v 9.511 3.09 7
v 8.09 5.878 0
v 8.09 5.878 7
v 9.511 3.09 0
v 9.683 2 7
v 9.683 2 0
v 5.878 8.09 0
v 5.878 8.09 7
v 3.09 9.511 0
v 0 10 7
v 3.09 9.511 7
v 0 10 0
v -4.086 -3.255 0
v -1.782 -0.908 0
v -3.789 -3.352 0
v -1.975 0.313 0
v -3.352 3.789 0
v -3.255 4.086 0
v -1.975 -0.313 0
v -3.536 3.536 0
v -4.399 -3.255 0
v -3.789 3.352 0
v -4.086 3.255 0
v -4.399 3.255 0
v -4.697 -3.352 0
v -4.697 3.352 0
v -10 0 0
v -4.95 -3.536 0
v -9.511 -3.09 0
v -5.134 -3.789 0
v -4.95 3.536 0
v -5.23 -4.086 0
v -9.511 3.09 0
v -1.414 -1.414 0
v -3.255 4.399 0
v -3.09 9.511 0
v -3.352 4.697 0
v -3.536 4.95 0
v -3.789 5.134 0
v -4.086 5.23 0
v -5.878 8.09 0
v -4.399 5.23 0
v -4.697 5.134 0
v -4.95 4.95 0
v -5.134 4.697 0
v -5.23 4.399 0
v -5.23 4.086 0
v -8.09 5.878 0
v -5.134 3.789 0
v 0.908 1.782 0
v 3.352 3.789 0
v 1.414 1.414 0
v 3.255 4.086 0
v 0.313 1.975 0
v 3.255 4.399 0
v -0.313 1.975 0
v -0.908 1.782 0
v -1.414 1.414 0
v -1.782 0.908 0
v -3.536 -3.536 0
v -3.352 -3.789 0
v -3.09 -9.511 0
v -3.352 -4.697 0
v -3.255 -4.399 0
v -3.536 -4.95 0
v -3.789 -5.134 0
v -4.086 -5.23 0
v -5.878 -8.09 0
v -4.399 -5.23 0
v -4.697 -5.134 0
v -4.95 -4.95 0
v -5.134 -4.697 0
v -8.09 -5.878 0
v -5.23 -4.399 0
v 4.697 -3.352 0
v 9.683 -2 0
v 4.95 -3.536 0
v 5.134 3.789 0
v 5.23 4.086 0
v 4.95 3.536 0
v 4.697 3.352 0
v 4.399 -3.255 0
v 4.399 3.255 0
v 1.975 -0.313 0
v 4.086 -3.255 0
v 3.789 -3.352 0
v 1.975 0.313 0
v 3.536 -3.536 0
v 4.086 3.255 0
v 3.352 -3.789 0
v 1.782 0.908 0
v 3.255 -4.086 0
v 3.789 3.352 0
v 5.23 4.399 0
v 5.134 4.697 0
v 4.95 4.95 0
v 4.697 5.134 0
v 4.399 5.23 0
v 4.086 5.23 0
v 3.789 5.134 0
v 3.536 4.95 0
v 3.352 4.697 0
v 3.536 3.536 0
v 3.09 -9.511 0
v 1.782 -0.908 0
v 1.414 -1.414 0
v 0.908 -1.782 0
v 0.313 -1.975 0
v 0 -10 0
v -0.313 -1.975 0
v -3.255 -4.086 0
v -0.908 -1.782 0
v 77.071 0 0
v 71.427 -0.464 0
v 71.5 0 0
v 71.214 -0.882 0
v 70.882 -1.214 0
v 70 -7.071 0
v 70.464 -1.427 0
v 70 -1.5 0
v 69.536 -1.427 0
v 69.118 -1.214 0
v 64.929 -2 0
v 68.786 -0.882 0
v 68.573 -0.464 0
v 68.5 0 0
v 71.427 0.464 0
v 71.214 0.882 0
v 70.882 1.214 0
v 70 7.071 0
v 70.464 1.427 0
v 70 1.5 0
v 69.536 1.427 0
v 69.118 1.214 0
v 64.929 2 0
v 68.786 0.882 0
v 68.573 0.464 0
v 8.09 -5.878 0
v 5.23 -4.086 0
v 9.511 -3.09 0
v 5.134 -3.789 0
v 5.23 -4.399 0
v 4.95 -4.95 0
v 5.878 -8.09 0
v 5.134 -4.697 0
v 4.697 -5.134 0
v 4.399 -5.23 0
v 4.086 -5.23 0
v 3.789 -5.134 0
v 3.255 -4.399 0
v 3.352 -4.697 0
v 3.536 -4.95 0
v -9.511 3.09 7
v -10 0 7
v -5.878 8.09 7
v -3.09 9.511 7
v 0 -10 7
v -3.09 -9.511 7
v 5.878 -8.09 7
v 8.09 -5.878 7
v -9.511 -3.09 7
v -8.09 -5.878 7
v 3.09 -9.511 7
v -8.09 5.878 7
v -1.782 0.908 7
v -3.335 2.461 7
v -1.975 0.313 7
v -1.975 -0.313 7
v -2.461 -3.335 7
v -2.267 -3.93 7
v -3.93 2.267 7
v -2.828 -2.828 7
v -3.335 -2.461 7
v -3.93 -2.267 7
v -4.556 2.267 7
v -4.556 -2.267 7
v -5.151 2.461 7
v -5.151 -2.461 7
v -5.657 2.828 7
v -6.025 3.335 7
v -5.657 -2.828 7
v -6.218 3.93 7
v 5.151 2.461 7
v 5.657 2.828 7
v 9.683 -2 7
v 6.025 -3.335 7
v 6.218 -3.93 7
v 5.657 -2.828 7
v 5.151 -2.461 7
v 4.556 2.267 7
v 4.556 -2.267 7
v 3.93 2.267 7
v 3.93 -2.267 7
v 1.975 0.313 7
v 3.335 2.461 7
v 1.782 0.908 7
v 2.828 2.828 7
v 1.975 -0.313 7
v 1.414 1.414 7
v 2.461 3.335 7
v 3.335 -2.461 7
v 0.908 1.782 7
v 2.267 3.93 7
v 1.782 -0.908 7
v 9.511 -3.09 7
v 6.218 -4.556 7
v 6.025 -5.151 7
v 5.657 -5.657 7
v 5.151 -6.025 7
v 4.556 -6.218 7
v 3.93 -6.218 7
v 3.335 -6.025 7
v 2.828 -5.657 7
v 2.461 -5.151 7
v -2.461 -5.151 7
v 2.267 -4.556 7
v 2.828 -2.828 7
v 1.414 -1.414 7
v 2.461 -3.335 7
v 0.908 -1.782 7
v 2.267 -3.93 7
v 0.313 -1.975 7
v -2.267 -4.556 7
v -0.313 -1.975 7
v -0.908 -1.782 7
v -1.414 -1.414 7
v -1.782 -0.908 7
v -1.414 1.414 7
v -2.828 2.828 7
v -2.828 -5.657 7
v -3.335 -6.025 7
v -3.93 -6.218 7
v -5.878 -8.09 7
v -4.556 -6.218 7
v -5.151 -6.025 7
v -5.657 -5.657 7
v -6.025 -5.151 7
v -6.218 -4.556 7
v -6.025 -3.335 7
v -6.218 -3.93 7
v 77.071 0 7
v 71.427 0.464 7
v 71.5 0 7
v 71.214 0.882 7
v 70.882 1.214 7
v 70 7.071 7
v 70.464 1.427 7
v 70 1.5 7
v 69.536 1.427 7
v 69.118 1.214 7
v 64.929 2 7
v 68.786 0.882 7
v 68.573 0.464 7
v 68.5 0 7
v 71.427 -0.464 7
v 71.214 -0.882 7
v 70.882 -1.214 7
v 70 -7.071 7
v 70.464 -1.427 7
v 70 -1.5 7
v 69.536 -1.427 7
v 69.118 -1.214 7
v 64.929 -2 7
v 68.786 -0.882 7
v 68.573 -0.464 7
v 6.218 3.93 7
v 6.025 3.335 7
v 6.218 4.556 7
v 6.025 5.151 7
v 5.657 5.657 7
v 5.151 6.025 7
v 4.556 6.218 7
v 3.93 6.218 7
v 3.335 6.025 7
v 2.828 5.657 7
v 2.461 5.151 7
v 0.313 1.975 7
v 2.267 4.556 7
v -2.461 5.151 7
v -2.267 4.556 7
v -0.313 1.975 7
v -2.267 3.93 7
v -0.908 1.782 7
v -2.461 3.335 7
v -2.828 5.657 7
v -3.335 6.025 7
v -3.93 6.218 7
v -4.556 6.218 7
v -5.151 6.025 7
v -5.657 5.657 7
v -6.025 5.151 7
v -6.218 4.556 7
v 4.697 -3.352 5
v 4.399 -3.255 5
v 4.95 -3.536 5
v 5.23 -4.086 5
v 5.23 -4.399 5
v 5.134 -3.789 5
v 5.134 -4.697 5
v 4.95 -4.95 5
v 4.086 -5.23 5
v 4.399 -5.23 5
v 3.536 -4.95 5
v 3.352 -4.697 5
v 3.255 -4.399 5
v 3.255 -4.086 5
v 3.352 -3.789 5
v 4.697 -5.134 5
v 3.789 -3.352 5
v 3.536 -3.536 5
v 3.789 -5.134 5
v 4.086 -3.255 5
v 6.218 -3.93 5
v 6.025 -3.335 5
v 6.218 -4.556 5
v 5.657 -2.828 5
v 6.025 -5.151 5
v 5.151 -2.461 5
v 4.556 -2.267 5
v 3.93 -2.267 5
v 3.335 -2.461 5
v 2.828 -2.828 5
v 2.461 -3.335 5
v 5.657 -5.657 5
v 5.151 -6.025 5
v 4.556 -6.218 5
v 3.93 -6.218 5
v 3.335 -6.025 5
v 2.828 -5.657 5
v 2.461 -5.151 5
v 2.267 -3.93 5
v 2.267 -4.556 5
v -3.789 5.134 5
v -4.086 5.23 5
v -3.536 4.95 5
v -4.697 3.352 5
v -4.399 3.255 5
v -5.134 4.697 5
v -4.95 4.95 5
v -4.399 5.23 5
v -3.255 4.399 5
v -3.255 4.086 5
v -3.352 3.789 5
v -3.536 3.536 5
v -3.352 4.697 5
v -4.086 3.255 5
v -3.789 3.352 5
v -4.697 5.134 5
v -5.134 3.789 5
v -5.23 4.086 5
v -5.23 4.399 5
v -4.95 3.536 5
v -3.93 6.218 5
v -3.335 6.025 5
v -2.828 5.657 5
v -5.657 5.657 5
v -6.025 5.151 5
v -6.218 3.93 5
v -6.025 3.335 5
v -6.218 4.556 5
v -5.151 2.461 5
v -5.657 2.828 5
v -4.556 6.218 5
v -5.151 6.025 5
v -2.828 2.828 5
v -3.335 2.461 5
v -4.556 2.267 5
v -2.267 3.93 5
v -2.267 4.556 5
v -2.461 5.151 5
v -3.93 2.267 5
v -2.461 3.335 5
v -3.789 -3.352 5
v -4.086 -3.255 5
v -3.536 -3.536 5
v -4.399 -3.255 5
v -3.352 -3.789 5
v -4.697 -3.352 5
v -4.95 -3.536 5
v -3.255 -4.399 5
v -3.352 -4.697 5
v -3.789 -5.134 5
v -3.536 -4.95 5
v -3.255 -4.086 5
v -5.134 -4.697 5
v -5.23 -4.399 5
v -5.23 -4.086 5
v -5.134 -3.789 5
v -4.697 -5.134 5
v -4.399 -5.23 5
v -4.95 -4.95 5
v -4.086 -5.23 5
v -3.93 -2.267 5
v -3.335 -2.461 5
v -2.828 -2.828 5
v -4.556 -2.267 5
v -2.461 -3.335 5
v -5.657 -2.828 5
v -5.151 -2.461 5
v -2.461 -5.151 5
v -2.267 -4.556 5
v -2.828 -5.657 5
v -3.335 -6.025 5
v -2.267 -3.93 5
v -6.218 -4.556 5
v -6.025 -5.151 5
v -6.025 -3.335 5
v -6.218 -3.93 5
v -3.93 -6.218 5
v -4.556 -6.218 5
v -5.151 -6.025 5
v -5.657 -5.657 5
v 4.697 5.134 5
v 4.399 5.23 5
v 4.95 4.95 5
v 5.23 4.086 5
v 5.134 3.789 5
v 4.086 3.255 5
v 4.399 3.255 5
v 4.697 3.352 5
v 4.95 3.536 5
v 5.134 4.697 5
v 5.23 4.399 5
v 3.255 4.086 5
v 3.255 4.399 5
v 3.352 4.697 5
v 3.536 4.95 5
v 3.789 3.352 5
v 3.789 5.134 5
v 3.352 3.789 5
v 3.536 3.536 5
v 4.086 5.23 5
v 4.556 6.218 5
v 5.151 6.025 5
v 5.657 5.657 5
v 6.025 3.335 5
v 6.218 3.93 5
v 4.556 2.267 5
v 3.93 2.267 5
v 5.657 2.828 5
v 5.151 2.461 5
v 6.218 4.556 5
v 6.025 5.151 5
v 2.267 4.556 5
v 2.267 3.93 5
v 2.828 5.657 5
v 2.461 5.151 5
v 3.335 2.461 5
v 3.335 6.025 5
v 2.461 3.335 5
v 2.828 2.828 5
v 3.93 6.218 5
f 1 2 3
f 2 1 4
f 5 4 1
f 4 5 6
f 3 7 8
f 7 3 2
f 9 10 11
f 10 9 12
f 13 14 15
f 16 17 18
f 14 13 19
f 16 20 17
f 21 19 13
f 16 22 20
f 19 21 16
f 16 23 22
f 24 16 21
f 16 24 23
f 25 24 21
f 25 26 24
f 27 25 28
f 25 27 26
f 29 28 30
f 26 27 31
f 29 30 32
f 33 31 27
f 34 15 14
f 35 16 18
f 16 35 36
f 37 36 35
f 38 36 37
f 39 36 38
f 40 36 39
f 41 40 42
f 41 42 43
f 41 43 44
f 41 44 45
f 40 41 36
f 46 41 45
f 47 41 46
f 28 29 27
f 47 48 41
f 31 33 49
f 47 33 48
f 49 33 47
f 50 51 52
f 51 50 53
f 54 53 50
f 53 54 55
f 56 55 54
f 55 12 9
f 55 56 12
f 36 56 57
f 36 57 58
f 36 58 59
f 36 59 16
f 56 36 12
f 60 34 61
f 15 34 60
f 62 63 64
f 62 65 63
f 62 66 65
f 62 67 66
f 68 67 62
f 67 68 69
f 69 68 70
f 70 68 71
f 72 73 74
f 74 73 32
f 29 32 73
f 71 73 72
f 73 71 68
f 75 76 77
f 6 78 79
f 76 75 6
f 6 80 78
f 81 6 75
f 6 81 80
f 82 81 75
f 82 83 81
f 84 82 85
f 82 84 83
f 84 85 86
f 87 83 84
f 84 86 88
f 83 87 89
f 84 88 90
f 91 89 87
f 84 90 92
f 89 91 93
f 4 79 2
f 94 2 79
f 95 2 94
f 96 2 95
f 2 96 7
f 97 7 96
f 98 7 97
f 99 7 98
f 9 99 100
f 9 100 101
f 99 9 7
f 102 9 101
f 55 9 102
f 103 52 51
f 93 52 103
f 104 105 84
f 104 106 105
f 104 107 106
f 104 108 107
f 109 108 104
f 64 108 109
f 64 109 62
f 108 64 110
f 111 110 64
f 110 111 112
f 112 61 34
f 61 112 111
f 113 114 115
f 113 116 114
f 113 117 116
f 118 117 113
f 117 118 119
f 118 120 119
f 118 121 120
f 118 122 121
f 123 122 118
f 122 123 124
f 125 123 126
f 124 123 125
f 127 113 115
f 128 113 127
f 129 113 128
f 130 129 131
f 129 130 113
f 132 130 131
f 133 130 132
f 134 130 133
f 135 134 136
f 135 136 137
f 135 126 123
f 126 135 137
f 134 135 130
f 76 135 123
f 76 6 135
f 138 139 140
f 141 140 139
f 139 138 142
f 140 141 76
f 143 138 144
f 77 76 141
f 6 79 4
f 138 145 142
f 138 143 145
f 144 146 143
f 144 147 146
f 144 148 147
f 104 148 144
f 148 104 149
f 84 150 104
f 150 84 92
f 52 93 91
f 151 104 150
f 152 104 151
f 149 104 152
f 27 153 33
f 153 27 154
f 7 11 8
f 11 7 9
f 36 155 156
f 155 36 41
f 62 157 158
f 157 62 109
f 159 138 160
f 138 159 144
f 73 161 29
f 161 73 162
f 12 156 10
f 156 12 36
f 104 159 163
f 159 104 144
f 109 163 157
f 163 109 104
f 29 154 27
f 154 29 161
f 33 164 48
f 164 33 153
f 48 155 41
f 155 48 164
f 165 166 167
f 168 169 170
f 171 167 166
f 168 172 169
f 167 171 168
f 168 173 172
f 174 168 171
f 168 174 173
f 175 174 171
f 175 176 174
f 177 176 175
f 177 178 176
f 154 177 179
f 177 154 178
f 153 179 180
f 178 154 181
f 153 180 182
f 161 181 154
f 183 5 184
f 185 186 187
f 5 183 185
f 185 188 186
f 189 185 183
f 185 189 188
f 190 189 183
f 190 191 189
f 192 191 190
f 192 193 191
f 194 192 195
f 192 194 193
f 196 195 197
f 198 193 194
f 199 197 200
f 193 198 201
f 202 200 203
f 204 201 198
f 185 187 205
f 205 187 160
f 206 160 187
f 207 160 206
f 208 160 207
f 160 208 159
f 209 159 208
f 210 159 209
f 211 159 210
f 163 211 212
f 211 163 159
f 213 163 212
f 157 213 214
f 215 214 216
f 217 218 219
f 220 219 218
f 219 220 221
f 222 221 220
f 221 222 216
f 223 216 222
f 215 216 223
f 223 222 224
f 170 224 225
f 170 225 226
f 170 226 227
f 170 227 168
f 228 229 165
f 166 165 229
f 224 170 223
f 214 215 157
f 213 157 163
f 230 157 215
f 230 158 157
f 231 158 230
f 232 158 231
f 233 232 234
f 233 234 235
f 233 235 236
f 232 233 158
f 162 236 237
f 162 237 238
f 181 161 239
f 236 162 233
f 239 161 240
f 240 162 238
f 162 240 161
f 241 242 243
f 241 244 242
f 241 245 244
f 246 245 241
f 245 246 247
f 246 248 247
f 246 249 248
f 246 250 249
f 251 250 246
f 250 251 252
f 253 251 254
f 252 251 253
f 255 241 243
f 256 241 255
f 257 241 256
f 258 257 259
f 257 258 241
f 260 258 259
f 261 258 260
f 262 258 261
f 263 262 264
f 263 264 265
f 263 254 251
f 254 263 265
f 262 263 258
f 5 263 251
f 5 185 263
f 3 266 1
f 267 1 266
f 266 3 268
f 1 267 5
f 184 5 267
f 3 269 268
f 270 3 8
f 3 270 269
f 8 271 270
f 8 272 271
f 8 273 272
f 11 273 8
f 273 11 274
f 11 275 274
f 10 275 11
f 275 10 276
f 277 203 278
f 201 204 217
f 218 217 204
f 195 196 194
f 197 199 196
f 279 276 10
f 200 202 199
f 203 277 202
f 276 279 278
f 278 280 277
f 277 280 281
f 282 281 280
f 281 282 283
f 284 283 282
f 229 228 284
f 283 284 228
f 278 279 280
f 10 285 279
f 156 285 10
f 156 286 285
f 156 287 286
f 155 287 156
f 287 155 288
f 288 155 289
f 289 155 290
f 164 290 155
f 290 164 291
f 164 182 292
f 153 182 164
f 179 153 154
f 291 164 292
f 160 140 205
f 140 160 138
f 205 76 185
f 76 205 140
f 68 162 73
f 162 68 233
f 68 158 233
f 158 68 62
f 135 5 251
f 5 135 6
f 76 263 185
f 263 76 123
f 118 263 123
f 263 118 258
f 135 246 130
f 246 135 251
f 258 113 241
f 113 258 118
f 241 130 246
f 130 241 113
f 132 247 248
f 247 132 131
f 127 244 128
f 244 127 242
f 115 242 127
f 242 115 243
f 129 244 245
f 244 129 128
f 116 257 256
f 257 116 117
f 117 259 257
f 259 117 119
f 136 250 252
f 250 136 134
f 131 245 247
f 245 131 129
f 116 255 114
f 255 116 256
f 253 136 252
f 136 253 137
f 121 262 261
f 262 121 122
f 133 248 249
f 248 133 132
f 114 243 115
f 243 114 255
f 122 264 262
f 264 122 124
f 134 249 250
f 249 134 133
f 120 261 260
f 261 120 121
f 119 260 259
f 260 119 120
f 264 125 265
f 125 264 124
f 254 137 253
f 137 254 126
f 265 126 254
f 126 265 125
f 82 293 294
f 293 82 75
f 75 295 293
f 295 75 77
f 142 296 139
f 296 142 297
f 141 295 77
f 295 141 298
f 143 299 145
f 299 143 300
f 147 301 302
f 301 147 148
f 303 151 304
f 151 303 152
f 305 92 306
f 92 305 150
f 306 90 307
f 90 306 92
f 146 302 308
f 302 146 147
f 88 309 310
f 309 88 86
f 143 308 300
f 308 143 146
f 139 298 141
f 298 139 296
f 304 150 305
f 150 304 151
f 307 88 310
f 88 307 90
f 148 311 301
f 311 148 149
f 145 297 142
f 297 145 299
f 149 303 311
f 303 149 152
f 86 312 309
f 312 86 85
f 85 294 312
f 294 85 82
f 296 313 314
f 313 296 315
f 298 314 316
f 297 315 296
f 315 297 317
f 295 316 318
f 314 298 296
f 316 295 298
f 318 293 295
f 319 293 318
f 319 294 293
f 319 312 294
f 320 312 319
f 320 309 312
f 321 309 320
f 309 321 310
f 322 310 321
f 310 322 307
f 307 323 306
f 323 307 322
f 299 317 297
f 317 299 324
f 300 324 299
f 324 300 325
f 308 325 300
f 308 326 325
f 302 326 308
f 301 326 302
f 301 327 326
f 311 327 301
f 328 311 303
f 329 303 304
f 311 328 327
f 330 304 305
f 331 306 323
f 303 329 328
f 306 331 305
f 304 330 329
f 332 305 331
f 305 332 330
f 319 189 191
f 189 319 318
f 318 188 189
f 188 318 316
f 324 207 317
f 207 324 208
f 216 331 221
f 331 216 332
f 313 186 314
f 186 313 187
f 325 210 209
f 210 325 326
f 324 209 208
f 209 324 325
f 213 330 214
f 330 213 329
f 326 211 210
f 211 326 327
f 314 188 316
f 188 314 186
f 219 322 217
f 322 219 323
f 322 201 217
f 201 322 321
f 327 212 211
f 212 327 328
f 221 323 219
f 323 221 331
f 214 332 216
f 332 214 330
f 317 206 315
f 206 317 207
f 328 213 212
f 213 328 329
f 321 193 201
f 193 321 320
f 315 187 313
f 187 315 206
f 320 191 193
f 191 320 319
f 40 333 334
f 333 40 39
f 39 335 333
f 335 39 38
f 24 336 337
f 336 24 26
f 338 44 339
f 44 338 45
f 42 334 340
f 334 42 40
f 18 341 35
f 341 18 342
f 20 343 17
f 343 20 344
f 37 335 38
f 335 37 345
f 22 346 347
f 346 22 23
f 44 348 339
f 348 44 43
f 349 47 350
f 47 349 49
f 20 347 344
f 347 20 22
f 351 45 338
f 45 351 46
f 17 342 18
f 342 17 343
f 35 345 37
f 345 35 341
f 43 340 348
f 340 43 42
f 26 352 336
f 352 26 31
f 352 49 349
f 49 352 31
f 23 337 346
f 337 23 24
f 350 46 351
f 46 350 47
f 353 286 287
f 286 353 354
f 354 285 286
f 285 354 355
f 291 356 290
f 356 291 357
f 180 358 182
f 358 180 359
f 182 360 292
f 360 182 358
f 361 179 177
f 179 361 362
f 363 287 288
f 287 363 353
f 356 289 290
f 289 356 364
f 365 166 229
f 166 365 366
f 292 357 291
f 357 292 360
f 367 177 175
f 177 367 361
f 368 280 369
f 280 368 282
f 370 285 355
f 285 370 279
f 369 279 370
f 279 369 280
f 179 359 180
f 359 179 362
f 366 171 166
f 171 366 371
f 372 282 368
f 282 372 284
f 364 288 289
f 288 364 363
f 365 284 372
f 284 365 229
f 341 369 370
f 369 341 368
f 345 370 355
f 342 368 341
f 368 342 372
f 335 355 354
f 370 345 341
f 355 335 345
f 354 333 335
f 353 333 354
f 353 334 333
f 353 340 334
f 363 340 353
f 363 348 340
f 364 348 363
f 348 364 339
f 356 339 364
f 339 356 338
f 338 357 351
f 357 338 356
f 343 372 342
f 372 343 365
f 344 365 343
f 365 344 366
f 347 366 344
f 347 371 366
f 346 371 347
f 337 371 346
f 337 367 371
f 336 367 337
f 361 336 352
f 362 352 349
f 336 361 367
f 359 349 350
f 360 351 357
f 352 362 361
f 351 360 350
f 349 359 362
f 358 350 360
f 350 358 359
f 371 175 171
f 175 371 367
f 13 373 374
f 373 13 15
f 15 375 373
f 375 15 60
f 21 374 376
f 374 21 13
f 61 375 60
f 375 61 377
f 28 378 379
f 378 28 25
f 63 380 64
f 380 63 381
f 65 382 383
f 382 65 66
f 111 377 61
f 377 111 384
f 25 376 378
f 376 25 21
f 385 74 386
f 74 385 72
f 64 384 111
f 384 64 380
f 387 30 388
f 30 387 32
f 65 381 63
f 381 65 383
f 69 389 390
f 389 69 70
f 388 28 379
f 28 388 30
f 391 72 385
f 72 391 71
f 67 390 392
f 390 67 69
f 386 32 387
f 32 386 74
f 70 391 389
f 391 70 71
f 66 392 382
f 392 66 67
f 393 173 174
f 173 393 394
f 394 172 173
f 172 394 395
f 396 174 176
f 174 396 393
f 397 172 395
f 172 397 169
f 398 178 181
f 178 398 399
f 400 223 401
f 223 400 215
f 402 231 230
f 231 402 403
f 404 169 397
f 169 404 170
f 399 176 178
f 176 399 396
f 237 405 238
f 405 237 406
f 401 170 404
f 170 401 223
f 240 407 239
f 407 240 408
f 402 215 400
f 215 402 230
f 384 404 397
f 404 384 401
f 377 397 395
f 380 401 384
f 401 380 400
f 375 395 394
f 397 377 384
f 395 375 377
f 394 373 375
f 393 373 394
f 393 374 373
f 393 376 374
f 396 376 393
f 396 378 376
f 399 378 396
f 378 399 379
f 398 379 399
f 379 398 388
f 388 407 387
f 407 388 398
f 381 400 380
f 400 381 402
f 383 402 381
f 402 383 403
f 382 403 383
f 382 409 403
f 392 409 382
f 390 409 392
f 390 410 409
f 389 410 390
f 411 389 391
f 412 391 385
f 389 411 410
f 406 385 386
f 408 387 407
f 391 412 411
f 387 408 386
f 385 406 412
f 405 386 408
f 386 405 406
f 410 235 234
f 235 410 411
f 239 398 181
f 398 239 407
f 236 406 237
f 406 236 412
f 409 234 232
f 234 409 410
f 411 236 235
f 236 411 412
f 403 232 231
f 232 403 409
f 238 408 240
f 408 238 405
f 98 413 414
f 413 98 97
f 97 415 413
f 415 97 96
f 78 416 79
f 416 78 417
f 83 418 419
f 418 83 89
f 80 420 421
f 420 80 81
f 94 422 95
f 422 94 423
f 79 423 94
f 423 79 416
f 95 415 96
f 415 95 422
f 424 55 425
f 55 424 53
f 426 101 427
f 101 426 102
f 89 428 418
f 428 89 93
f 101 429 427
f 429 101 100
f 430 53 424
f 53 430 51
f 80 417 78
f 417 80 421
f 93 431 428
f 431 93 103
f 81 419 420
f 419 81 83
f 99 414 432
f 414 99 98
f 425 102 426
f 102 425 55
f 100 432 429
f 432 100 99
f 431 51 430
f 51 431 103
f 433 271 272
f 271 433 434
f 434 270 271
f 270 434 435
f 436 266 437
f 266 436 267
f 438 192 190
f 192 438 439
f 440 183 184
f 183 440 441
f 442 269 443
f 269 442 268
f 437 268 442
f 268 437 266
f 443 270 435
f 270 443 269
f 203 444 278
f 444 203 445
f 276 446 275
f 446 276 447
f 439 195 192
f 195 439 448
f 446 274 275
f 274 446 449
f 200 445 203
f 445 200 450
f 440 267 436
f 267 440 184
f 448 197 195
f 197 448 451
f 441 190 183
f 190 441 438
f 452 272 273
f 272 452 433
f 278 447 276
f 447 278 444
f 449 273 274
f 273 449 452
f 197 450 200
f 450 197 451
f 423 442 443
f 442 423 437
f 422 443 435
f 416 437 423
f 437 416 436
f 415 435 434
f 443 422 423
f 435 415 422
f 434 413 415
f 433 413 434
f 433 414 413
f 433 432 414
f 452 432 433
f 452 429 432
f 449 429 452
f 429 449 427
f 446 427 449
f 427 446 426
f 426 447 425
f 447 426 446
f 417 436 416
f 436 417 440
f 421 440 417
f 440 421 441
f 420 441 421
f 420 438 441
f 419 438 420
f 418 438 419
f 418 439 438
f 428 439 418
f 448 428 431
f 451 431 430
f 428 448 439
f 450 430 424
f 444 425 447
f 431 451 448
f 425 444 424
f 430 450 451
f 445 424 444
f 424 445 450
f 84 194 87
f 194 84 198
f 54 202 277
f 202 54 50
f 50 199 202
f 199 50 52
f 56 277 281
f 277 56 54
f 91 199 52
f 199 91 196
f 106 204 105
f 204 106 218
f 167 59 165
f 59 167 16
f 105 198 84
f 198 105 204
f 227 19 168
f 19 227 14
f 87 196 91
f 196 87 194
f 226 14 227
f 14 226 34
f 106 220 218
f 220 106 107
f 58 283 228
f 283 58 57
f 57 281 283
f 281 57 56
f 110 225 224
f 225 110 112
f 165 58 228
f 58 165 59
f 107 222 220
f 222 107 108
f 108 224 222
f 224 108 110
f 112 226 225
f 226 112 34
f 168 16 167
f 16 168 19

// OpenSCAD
fn = 20;
hole_spc = 12;
h = 7;

module motor_holes() {
    translate([0, -hole_spc/2, 0])
        cylinder(h, 1, 1, $fn=fn);
    translate([0, -hole_spc/2, h-2])
        cylinder(2, 2, 2, $fn=fn);
    
    translate([0, hole_spc/2, 0])
        cylinder(h, 1, 1, $fn=fn);
    translate([0, hole_spc/2, h-2])
        cylinder(2, 2, 2, $fn=fn);
    
    translate([-hole_spc/2, 0, 0])
        cylinder(h, 1, 1, $fn=fn);
    translate([-hole_spc/2, 0, h-2])
        cylinder(2, 2, 2, $fn=fn);
    
    translate([hole_spc/2, 0, 0])
        cylinder(h, 1, 1, $fn=fn);
    translate([hole_spc/2, 0, h-2])
        cylinder(2, 2, 2, $fn=fn);
    
    //motor bearing
    cylinder(h, 2, 2, $fn=fn);
}

module mount_arm() {
    w = 10;
    l = 70;
    difference() {
        union(){
            cylinder(h, 10, 10, $fn=fn);
            translate([0, -2, 0])
                cube([l, 4, h]);
            translate([l, 0, 0])
                rotate([0,0,45])
                    translate([-w/2, -w/2, 0])
                    cube([w, w, h]); // 18mm 
        }
        translate([l, 0, 0])
            cylinder(h=h, r=1.5, $fn=fn);
        /*
        translate([54, -8.3, 0])
            cylinder(h=h, r=6.32, $fn=fn);
        translate([55, 8.3, 0])
            cylinder(h=h, r=6.32, $fn=fn);
        */
    }
    
}


difference(){
    mount_arm();
    rotate([0,0,45])
        motor_holes();

    
    translate([65, -hole_spc/2, 0])
        cylinder(h, 1, 1, $fn=fn);
    translate([65, hole_spc/2, 0])
        cylinder(h, 1, 1, $fn=fn);
    
    
}
